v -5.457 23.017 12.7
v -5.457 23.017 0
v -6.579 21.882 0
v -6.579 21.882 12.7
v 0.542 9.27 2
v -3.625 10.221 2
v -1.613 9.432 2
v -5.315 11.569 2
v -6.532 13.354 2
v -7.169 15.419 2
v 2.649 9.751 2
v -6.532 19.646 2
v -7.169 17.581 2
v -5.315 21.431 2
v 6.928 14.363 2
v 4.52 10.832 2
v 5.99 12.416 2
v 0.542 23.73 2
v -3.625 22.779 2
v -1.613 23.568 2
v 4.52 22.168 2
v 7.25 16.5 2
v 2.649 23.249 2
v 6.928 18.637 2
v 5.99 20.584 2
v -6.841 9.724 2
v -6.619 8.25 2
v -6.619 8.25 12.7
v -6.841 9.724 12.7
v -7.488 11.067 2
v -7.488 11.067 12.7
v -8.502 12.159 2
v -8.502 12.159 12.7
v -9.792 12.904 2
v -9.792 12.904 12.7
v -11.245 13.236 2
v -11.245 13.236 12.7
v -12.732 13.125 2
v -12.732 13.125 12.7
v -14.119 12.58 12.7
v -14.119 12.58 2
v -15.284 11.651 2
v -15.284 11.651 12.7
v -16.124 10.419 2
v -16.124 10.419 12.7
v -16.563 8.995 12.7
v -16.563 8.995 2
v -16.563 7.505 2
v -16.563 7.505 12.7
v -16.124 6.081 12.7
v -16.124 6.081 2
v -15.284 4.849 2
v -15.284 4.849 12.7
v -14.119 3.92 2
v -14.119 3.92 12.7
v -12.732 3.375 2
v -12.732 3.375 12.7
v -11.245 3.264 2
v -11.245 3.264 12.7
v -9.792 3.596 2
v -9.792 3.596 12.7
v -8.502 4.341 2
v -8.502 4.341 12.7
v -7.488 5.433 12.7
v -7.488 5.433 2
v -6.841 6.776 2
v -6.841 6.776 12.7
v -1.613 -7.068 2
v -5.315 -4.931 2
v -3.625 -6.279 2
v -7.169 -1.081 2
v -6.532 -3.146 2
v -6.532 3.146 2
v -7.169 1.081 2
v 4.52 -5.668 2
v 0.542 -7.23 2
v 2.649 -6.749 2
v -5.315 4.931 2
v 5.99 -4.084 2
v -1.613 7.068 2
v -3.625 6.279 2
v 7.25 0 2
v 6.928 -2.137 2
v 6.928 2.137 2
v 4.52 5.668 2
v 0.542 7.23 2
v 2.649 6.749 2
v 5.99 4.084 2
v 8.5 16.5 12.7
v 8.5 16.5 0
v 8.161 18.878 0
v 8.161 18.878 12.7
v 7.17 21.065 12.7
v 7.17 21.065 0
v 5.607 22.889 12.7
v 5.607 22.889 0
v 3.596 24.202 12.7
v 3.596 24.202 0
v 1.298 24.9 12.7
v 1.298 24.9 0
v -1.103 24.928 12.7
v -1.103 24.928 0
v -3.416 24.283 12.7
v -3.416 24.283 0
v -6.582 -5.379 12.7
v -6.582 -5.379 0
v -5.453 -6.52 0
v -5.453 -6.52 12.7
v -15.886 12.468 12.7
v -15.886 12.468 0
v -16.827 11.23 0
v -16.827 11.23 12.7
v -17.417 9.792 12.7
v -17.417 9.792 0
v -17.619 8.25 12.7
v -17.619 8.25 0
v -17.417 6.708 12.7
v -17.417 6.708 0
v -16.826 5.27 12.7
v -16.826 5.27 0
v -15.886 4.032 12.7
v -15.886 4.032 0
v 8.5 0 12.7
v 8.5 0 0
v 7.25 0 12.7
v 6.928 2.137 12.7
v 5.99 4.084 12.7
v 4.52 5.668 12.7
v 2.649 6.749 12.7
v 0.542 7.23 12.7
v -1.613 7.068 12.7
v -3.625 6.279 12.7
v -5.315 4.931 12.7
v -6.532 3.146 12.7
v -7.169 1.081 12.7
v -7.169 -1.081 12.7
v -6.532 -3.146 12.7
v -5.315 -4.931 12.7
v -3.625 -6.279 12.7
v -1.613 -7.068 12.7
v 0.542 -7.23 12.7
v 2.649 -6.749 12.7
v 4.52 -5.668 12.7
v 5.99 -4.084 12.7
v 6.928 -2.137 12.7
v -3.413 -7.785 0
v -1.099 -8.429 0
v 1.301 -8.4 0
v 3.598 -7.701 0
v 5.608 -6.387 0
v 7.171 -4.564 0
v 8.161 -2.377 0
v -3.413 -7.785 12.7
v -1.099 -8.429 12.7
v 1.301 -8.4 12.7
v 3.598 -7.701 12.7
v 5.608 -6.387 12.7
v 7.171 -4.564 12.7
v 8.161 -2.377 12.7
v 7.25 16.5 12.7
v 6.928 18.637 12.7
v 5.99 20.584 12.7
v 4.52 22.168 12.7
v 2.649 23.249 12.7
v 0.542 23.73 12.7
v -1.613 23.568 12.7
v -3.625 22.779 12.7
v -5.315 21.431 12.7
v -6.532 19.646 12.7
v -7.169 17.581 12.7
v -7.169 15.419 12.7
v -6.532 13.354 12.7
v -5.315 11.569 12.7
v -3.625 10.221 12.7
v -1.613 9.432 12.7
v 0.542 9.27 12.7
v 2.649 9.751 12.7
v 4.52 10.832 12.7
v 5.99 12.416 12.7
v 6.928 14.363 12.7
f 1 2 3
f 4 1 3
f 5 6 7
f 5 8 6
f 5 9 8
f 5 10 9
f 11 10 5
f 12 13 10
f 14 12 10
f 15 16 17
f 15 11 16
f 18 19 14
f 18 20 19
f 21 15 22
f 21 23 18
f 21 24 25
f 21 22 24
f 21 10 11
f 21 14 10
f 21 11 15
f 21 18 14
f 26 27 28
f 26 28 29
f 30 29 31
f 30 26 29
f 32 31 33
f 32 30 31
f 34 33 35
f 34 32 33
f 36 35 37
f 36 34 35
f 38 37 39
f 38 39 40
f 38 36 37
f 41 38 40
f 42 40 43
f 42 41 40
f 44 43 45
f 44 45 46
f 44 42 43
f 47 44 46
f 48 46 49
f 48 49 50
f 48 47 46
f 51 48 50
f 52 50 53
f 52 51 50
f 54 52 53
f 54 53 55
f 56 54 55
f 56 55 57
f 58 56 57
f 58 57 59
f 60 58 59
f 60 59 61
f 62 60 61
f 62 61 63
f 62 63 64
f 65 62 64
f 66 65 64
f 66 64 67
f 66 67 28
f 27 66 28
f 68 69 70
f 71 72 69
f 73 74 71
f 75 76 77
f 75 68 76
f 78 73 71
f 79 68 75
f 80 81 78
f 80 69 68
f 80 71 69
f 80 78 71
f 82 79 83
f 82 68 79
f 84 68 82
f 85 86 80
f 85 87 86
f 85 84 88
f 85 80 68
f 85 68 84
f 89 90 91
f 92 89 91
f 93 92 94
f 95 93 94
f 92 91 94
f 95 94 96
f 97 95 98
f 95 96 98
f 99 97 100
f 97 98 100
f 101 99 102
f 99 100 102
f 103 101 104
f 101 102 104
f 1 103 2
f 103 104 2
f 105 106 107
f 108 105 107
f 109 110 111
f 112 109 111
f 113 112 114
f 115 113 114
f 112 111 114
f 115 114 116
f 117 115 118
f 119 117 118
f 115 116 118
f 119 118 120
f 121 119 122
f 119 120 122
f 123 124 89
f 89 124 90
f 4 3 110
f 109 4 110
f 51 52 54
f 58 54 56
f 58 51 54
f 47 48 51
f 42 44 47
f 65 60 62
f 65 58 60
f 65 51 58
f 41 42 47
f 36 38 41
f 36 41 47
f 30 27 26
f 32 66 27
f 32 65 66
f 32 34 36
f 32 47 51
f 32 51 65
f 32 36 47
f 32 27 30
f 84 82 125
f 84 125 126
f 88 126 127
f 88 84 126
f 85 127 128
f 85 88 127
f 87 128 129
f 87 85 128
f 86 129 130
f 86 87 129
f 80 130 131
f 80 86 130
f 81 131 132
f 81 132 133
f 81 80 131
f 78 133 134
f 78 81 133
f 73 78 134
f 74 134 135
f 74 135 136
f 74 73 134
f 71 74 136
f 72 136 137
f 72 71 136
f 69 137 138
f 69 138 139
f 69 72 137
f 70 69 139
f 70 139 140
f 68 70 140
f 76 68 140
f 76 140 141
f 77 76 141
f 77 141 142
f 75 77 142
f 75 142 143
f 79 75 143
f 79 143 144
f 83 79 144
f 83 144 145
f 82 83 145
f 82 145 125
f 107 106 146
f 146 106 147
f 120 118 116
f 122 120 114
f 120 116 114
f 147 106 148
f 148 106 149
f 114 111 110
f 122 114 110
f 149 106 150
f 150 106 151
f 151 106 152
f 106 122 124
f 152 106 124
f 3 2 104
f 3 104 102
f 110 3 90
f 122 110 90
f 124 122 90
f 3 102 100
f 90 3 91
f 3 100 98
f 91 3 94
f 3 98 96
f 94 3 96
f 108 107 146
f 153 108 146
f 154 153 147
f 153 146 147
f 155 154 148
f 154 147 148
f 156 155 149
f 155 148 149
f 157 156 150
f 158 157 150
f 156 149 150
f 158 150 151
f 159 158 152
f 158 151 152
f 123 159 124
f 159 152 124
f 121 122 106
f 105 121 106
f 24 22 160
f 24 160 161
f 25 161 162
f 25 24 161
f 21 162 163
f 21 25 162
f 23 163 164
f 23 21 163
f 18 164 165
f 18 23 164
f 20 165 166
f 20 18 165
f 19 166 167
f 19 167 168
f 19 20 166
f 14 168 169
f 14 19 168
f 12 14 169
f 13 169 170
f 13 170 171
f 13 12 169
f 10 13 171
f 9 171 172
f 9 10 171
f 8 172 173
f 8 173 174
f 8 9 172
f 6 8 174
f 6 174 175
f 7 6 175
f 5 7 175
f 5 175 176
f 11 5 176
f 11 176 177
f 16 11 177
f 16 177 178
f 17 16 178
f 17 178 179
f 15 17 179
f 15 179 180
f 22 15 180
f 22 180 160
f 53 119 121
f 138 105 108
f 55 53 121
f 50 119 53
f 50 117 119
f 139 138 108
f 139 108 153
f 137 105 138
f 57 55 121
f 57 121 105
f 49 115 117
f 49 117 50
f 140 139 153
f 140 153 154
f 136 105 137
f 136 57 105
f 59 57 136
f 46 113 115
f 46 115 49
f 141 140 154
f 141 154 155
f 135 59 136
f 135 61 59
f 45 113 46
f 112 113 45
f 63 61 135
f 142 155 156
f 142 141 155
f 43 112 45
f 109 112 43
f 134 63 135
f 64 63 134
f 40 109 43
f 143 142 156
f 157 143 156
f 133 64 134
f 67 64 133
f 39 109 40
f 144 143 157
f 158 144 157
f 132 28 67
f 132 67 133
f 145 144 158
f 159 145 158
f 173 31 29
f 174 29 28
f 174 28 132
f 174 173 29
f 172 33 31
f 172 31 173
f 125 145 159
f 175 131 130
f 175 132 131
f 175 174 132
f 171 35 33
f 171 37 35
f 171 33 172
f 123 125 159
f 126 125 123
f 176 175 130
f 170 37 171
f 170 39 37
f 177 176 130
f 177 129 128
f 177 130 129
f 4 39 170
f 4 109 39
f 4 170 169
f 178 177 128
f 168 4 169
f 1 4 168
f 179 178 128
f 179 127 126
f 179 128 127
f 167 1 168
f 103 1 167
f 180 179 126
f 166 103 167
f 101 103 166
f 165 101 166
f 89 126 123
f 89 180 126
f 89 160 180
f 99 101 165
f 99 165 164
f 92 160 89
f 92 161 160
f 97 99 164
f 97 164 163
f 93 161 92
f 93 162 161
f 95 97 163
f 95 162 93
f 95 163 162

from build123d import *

# Parameters (mm, degrees)
F0_R     = 5
F0_R_2   = 7.25
F1_DEPTH = 12.7
F2_DEPTH = 2


with BuildPart() as f1:
    # F0 (on Top) → F1 (new body)
    with BuildSketch(Plane.XY):
        with BuildLine():
            Line((8.5, 0), (8.5, 16.5))
            ThreePointArc((8.5, 16.5), (3.596169, 24.20179), (-5.457075, 23.016927))
            Line((-5.457075, 23.016927), (-6.578885, 21.882218))
            Line((-6.578885, 21.882218), (-15.885772, 12.46832))
            ThreePointArc((-15.885772, 12.46832), (-17.61895, 8.249909), (-15.885645, 4.03155))
            Line((-15.885645, 4.03155), (-6.581584, -5.378917))
            Line((-6.581584, -5.378917), (-5.45341, -6.519994))
            ThreePointArc((-5.45341, -6.519994), (3.598334, -7.700779), (8.5, 0))
        make_face()
        with Locations((-11.61895, 8.25)):
            Circle(F0_R, mode=Mode.SUBTRACT)
        Circle(F0_R_2, mode=Mode.SUBTRACT)
        with Locations((0, 16.5)):
            Circle(F0_R_2, mode=Mode.SUBTRACT)
    extrude(amount=F1_DEPTH)

    # F0 (on Top) → F2 (join)
    with BuildSketch(Plane.XY):
        with BuildLine():
            Line((8.5, 0), (8.5, 16.5))
            ThreePointArc((8.5, 16.5), (3.596169, 24.20179), (-5.457075, 23.016927))
            Line((-5.457075, 23.016927), (-6.578885, 21.882218))
            Line((-6.578885, 21.882218), (-15.885772, 12.46832))
            ThreePointArc((-15.885772, 12.46832), (-17.61895, 8.249909), (-15.885645, 4.03155))
            Line((-15.885645, 4.03155), (-6.581584, -5.378917))
            Line((-6.581584, -5.378917), (-5.45341, -6.519994))
            ThreePointArc((-5.45341, -6.519994), (3.598334, -7.700779), (8.5, 0))
        make_face()
        with Locations((-11.61895, 8.25)):
            Circle(F0_R, mode=Mode.SUBTRACT)
        Circle(F0_R_2, mode=Mode.SUBTRACT)
        with Locations((0, 16.5)):
            Circle(F0_R_2, mode=Mode.SUBTRACT)
        with Locations((0, 16.5)):
            Circle(F0_R_2)
        Circle(F0_R_2)
        with Locations((-11.61895, 8.25)):
            Circle(F0_R)
    extrude(amount=F2_DEPTH)


solid = f1.part
